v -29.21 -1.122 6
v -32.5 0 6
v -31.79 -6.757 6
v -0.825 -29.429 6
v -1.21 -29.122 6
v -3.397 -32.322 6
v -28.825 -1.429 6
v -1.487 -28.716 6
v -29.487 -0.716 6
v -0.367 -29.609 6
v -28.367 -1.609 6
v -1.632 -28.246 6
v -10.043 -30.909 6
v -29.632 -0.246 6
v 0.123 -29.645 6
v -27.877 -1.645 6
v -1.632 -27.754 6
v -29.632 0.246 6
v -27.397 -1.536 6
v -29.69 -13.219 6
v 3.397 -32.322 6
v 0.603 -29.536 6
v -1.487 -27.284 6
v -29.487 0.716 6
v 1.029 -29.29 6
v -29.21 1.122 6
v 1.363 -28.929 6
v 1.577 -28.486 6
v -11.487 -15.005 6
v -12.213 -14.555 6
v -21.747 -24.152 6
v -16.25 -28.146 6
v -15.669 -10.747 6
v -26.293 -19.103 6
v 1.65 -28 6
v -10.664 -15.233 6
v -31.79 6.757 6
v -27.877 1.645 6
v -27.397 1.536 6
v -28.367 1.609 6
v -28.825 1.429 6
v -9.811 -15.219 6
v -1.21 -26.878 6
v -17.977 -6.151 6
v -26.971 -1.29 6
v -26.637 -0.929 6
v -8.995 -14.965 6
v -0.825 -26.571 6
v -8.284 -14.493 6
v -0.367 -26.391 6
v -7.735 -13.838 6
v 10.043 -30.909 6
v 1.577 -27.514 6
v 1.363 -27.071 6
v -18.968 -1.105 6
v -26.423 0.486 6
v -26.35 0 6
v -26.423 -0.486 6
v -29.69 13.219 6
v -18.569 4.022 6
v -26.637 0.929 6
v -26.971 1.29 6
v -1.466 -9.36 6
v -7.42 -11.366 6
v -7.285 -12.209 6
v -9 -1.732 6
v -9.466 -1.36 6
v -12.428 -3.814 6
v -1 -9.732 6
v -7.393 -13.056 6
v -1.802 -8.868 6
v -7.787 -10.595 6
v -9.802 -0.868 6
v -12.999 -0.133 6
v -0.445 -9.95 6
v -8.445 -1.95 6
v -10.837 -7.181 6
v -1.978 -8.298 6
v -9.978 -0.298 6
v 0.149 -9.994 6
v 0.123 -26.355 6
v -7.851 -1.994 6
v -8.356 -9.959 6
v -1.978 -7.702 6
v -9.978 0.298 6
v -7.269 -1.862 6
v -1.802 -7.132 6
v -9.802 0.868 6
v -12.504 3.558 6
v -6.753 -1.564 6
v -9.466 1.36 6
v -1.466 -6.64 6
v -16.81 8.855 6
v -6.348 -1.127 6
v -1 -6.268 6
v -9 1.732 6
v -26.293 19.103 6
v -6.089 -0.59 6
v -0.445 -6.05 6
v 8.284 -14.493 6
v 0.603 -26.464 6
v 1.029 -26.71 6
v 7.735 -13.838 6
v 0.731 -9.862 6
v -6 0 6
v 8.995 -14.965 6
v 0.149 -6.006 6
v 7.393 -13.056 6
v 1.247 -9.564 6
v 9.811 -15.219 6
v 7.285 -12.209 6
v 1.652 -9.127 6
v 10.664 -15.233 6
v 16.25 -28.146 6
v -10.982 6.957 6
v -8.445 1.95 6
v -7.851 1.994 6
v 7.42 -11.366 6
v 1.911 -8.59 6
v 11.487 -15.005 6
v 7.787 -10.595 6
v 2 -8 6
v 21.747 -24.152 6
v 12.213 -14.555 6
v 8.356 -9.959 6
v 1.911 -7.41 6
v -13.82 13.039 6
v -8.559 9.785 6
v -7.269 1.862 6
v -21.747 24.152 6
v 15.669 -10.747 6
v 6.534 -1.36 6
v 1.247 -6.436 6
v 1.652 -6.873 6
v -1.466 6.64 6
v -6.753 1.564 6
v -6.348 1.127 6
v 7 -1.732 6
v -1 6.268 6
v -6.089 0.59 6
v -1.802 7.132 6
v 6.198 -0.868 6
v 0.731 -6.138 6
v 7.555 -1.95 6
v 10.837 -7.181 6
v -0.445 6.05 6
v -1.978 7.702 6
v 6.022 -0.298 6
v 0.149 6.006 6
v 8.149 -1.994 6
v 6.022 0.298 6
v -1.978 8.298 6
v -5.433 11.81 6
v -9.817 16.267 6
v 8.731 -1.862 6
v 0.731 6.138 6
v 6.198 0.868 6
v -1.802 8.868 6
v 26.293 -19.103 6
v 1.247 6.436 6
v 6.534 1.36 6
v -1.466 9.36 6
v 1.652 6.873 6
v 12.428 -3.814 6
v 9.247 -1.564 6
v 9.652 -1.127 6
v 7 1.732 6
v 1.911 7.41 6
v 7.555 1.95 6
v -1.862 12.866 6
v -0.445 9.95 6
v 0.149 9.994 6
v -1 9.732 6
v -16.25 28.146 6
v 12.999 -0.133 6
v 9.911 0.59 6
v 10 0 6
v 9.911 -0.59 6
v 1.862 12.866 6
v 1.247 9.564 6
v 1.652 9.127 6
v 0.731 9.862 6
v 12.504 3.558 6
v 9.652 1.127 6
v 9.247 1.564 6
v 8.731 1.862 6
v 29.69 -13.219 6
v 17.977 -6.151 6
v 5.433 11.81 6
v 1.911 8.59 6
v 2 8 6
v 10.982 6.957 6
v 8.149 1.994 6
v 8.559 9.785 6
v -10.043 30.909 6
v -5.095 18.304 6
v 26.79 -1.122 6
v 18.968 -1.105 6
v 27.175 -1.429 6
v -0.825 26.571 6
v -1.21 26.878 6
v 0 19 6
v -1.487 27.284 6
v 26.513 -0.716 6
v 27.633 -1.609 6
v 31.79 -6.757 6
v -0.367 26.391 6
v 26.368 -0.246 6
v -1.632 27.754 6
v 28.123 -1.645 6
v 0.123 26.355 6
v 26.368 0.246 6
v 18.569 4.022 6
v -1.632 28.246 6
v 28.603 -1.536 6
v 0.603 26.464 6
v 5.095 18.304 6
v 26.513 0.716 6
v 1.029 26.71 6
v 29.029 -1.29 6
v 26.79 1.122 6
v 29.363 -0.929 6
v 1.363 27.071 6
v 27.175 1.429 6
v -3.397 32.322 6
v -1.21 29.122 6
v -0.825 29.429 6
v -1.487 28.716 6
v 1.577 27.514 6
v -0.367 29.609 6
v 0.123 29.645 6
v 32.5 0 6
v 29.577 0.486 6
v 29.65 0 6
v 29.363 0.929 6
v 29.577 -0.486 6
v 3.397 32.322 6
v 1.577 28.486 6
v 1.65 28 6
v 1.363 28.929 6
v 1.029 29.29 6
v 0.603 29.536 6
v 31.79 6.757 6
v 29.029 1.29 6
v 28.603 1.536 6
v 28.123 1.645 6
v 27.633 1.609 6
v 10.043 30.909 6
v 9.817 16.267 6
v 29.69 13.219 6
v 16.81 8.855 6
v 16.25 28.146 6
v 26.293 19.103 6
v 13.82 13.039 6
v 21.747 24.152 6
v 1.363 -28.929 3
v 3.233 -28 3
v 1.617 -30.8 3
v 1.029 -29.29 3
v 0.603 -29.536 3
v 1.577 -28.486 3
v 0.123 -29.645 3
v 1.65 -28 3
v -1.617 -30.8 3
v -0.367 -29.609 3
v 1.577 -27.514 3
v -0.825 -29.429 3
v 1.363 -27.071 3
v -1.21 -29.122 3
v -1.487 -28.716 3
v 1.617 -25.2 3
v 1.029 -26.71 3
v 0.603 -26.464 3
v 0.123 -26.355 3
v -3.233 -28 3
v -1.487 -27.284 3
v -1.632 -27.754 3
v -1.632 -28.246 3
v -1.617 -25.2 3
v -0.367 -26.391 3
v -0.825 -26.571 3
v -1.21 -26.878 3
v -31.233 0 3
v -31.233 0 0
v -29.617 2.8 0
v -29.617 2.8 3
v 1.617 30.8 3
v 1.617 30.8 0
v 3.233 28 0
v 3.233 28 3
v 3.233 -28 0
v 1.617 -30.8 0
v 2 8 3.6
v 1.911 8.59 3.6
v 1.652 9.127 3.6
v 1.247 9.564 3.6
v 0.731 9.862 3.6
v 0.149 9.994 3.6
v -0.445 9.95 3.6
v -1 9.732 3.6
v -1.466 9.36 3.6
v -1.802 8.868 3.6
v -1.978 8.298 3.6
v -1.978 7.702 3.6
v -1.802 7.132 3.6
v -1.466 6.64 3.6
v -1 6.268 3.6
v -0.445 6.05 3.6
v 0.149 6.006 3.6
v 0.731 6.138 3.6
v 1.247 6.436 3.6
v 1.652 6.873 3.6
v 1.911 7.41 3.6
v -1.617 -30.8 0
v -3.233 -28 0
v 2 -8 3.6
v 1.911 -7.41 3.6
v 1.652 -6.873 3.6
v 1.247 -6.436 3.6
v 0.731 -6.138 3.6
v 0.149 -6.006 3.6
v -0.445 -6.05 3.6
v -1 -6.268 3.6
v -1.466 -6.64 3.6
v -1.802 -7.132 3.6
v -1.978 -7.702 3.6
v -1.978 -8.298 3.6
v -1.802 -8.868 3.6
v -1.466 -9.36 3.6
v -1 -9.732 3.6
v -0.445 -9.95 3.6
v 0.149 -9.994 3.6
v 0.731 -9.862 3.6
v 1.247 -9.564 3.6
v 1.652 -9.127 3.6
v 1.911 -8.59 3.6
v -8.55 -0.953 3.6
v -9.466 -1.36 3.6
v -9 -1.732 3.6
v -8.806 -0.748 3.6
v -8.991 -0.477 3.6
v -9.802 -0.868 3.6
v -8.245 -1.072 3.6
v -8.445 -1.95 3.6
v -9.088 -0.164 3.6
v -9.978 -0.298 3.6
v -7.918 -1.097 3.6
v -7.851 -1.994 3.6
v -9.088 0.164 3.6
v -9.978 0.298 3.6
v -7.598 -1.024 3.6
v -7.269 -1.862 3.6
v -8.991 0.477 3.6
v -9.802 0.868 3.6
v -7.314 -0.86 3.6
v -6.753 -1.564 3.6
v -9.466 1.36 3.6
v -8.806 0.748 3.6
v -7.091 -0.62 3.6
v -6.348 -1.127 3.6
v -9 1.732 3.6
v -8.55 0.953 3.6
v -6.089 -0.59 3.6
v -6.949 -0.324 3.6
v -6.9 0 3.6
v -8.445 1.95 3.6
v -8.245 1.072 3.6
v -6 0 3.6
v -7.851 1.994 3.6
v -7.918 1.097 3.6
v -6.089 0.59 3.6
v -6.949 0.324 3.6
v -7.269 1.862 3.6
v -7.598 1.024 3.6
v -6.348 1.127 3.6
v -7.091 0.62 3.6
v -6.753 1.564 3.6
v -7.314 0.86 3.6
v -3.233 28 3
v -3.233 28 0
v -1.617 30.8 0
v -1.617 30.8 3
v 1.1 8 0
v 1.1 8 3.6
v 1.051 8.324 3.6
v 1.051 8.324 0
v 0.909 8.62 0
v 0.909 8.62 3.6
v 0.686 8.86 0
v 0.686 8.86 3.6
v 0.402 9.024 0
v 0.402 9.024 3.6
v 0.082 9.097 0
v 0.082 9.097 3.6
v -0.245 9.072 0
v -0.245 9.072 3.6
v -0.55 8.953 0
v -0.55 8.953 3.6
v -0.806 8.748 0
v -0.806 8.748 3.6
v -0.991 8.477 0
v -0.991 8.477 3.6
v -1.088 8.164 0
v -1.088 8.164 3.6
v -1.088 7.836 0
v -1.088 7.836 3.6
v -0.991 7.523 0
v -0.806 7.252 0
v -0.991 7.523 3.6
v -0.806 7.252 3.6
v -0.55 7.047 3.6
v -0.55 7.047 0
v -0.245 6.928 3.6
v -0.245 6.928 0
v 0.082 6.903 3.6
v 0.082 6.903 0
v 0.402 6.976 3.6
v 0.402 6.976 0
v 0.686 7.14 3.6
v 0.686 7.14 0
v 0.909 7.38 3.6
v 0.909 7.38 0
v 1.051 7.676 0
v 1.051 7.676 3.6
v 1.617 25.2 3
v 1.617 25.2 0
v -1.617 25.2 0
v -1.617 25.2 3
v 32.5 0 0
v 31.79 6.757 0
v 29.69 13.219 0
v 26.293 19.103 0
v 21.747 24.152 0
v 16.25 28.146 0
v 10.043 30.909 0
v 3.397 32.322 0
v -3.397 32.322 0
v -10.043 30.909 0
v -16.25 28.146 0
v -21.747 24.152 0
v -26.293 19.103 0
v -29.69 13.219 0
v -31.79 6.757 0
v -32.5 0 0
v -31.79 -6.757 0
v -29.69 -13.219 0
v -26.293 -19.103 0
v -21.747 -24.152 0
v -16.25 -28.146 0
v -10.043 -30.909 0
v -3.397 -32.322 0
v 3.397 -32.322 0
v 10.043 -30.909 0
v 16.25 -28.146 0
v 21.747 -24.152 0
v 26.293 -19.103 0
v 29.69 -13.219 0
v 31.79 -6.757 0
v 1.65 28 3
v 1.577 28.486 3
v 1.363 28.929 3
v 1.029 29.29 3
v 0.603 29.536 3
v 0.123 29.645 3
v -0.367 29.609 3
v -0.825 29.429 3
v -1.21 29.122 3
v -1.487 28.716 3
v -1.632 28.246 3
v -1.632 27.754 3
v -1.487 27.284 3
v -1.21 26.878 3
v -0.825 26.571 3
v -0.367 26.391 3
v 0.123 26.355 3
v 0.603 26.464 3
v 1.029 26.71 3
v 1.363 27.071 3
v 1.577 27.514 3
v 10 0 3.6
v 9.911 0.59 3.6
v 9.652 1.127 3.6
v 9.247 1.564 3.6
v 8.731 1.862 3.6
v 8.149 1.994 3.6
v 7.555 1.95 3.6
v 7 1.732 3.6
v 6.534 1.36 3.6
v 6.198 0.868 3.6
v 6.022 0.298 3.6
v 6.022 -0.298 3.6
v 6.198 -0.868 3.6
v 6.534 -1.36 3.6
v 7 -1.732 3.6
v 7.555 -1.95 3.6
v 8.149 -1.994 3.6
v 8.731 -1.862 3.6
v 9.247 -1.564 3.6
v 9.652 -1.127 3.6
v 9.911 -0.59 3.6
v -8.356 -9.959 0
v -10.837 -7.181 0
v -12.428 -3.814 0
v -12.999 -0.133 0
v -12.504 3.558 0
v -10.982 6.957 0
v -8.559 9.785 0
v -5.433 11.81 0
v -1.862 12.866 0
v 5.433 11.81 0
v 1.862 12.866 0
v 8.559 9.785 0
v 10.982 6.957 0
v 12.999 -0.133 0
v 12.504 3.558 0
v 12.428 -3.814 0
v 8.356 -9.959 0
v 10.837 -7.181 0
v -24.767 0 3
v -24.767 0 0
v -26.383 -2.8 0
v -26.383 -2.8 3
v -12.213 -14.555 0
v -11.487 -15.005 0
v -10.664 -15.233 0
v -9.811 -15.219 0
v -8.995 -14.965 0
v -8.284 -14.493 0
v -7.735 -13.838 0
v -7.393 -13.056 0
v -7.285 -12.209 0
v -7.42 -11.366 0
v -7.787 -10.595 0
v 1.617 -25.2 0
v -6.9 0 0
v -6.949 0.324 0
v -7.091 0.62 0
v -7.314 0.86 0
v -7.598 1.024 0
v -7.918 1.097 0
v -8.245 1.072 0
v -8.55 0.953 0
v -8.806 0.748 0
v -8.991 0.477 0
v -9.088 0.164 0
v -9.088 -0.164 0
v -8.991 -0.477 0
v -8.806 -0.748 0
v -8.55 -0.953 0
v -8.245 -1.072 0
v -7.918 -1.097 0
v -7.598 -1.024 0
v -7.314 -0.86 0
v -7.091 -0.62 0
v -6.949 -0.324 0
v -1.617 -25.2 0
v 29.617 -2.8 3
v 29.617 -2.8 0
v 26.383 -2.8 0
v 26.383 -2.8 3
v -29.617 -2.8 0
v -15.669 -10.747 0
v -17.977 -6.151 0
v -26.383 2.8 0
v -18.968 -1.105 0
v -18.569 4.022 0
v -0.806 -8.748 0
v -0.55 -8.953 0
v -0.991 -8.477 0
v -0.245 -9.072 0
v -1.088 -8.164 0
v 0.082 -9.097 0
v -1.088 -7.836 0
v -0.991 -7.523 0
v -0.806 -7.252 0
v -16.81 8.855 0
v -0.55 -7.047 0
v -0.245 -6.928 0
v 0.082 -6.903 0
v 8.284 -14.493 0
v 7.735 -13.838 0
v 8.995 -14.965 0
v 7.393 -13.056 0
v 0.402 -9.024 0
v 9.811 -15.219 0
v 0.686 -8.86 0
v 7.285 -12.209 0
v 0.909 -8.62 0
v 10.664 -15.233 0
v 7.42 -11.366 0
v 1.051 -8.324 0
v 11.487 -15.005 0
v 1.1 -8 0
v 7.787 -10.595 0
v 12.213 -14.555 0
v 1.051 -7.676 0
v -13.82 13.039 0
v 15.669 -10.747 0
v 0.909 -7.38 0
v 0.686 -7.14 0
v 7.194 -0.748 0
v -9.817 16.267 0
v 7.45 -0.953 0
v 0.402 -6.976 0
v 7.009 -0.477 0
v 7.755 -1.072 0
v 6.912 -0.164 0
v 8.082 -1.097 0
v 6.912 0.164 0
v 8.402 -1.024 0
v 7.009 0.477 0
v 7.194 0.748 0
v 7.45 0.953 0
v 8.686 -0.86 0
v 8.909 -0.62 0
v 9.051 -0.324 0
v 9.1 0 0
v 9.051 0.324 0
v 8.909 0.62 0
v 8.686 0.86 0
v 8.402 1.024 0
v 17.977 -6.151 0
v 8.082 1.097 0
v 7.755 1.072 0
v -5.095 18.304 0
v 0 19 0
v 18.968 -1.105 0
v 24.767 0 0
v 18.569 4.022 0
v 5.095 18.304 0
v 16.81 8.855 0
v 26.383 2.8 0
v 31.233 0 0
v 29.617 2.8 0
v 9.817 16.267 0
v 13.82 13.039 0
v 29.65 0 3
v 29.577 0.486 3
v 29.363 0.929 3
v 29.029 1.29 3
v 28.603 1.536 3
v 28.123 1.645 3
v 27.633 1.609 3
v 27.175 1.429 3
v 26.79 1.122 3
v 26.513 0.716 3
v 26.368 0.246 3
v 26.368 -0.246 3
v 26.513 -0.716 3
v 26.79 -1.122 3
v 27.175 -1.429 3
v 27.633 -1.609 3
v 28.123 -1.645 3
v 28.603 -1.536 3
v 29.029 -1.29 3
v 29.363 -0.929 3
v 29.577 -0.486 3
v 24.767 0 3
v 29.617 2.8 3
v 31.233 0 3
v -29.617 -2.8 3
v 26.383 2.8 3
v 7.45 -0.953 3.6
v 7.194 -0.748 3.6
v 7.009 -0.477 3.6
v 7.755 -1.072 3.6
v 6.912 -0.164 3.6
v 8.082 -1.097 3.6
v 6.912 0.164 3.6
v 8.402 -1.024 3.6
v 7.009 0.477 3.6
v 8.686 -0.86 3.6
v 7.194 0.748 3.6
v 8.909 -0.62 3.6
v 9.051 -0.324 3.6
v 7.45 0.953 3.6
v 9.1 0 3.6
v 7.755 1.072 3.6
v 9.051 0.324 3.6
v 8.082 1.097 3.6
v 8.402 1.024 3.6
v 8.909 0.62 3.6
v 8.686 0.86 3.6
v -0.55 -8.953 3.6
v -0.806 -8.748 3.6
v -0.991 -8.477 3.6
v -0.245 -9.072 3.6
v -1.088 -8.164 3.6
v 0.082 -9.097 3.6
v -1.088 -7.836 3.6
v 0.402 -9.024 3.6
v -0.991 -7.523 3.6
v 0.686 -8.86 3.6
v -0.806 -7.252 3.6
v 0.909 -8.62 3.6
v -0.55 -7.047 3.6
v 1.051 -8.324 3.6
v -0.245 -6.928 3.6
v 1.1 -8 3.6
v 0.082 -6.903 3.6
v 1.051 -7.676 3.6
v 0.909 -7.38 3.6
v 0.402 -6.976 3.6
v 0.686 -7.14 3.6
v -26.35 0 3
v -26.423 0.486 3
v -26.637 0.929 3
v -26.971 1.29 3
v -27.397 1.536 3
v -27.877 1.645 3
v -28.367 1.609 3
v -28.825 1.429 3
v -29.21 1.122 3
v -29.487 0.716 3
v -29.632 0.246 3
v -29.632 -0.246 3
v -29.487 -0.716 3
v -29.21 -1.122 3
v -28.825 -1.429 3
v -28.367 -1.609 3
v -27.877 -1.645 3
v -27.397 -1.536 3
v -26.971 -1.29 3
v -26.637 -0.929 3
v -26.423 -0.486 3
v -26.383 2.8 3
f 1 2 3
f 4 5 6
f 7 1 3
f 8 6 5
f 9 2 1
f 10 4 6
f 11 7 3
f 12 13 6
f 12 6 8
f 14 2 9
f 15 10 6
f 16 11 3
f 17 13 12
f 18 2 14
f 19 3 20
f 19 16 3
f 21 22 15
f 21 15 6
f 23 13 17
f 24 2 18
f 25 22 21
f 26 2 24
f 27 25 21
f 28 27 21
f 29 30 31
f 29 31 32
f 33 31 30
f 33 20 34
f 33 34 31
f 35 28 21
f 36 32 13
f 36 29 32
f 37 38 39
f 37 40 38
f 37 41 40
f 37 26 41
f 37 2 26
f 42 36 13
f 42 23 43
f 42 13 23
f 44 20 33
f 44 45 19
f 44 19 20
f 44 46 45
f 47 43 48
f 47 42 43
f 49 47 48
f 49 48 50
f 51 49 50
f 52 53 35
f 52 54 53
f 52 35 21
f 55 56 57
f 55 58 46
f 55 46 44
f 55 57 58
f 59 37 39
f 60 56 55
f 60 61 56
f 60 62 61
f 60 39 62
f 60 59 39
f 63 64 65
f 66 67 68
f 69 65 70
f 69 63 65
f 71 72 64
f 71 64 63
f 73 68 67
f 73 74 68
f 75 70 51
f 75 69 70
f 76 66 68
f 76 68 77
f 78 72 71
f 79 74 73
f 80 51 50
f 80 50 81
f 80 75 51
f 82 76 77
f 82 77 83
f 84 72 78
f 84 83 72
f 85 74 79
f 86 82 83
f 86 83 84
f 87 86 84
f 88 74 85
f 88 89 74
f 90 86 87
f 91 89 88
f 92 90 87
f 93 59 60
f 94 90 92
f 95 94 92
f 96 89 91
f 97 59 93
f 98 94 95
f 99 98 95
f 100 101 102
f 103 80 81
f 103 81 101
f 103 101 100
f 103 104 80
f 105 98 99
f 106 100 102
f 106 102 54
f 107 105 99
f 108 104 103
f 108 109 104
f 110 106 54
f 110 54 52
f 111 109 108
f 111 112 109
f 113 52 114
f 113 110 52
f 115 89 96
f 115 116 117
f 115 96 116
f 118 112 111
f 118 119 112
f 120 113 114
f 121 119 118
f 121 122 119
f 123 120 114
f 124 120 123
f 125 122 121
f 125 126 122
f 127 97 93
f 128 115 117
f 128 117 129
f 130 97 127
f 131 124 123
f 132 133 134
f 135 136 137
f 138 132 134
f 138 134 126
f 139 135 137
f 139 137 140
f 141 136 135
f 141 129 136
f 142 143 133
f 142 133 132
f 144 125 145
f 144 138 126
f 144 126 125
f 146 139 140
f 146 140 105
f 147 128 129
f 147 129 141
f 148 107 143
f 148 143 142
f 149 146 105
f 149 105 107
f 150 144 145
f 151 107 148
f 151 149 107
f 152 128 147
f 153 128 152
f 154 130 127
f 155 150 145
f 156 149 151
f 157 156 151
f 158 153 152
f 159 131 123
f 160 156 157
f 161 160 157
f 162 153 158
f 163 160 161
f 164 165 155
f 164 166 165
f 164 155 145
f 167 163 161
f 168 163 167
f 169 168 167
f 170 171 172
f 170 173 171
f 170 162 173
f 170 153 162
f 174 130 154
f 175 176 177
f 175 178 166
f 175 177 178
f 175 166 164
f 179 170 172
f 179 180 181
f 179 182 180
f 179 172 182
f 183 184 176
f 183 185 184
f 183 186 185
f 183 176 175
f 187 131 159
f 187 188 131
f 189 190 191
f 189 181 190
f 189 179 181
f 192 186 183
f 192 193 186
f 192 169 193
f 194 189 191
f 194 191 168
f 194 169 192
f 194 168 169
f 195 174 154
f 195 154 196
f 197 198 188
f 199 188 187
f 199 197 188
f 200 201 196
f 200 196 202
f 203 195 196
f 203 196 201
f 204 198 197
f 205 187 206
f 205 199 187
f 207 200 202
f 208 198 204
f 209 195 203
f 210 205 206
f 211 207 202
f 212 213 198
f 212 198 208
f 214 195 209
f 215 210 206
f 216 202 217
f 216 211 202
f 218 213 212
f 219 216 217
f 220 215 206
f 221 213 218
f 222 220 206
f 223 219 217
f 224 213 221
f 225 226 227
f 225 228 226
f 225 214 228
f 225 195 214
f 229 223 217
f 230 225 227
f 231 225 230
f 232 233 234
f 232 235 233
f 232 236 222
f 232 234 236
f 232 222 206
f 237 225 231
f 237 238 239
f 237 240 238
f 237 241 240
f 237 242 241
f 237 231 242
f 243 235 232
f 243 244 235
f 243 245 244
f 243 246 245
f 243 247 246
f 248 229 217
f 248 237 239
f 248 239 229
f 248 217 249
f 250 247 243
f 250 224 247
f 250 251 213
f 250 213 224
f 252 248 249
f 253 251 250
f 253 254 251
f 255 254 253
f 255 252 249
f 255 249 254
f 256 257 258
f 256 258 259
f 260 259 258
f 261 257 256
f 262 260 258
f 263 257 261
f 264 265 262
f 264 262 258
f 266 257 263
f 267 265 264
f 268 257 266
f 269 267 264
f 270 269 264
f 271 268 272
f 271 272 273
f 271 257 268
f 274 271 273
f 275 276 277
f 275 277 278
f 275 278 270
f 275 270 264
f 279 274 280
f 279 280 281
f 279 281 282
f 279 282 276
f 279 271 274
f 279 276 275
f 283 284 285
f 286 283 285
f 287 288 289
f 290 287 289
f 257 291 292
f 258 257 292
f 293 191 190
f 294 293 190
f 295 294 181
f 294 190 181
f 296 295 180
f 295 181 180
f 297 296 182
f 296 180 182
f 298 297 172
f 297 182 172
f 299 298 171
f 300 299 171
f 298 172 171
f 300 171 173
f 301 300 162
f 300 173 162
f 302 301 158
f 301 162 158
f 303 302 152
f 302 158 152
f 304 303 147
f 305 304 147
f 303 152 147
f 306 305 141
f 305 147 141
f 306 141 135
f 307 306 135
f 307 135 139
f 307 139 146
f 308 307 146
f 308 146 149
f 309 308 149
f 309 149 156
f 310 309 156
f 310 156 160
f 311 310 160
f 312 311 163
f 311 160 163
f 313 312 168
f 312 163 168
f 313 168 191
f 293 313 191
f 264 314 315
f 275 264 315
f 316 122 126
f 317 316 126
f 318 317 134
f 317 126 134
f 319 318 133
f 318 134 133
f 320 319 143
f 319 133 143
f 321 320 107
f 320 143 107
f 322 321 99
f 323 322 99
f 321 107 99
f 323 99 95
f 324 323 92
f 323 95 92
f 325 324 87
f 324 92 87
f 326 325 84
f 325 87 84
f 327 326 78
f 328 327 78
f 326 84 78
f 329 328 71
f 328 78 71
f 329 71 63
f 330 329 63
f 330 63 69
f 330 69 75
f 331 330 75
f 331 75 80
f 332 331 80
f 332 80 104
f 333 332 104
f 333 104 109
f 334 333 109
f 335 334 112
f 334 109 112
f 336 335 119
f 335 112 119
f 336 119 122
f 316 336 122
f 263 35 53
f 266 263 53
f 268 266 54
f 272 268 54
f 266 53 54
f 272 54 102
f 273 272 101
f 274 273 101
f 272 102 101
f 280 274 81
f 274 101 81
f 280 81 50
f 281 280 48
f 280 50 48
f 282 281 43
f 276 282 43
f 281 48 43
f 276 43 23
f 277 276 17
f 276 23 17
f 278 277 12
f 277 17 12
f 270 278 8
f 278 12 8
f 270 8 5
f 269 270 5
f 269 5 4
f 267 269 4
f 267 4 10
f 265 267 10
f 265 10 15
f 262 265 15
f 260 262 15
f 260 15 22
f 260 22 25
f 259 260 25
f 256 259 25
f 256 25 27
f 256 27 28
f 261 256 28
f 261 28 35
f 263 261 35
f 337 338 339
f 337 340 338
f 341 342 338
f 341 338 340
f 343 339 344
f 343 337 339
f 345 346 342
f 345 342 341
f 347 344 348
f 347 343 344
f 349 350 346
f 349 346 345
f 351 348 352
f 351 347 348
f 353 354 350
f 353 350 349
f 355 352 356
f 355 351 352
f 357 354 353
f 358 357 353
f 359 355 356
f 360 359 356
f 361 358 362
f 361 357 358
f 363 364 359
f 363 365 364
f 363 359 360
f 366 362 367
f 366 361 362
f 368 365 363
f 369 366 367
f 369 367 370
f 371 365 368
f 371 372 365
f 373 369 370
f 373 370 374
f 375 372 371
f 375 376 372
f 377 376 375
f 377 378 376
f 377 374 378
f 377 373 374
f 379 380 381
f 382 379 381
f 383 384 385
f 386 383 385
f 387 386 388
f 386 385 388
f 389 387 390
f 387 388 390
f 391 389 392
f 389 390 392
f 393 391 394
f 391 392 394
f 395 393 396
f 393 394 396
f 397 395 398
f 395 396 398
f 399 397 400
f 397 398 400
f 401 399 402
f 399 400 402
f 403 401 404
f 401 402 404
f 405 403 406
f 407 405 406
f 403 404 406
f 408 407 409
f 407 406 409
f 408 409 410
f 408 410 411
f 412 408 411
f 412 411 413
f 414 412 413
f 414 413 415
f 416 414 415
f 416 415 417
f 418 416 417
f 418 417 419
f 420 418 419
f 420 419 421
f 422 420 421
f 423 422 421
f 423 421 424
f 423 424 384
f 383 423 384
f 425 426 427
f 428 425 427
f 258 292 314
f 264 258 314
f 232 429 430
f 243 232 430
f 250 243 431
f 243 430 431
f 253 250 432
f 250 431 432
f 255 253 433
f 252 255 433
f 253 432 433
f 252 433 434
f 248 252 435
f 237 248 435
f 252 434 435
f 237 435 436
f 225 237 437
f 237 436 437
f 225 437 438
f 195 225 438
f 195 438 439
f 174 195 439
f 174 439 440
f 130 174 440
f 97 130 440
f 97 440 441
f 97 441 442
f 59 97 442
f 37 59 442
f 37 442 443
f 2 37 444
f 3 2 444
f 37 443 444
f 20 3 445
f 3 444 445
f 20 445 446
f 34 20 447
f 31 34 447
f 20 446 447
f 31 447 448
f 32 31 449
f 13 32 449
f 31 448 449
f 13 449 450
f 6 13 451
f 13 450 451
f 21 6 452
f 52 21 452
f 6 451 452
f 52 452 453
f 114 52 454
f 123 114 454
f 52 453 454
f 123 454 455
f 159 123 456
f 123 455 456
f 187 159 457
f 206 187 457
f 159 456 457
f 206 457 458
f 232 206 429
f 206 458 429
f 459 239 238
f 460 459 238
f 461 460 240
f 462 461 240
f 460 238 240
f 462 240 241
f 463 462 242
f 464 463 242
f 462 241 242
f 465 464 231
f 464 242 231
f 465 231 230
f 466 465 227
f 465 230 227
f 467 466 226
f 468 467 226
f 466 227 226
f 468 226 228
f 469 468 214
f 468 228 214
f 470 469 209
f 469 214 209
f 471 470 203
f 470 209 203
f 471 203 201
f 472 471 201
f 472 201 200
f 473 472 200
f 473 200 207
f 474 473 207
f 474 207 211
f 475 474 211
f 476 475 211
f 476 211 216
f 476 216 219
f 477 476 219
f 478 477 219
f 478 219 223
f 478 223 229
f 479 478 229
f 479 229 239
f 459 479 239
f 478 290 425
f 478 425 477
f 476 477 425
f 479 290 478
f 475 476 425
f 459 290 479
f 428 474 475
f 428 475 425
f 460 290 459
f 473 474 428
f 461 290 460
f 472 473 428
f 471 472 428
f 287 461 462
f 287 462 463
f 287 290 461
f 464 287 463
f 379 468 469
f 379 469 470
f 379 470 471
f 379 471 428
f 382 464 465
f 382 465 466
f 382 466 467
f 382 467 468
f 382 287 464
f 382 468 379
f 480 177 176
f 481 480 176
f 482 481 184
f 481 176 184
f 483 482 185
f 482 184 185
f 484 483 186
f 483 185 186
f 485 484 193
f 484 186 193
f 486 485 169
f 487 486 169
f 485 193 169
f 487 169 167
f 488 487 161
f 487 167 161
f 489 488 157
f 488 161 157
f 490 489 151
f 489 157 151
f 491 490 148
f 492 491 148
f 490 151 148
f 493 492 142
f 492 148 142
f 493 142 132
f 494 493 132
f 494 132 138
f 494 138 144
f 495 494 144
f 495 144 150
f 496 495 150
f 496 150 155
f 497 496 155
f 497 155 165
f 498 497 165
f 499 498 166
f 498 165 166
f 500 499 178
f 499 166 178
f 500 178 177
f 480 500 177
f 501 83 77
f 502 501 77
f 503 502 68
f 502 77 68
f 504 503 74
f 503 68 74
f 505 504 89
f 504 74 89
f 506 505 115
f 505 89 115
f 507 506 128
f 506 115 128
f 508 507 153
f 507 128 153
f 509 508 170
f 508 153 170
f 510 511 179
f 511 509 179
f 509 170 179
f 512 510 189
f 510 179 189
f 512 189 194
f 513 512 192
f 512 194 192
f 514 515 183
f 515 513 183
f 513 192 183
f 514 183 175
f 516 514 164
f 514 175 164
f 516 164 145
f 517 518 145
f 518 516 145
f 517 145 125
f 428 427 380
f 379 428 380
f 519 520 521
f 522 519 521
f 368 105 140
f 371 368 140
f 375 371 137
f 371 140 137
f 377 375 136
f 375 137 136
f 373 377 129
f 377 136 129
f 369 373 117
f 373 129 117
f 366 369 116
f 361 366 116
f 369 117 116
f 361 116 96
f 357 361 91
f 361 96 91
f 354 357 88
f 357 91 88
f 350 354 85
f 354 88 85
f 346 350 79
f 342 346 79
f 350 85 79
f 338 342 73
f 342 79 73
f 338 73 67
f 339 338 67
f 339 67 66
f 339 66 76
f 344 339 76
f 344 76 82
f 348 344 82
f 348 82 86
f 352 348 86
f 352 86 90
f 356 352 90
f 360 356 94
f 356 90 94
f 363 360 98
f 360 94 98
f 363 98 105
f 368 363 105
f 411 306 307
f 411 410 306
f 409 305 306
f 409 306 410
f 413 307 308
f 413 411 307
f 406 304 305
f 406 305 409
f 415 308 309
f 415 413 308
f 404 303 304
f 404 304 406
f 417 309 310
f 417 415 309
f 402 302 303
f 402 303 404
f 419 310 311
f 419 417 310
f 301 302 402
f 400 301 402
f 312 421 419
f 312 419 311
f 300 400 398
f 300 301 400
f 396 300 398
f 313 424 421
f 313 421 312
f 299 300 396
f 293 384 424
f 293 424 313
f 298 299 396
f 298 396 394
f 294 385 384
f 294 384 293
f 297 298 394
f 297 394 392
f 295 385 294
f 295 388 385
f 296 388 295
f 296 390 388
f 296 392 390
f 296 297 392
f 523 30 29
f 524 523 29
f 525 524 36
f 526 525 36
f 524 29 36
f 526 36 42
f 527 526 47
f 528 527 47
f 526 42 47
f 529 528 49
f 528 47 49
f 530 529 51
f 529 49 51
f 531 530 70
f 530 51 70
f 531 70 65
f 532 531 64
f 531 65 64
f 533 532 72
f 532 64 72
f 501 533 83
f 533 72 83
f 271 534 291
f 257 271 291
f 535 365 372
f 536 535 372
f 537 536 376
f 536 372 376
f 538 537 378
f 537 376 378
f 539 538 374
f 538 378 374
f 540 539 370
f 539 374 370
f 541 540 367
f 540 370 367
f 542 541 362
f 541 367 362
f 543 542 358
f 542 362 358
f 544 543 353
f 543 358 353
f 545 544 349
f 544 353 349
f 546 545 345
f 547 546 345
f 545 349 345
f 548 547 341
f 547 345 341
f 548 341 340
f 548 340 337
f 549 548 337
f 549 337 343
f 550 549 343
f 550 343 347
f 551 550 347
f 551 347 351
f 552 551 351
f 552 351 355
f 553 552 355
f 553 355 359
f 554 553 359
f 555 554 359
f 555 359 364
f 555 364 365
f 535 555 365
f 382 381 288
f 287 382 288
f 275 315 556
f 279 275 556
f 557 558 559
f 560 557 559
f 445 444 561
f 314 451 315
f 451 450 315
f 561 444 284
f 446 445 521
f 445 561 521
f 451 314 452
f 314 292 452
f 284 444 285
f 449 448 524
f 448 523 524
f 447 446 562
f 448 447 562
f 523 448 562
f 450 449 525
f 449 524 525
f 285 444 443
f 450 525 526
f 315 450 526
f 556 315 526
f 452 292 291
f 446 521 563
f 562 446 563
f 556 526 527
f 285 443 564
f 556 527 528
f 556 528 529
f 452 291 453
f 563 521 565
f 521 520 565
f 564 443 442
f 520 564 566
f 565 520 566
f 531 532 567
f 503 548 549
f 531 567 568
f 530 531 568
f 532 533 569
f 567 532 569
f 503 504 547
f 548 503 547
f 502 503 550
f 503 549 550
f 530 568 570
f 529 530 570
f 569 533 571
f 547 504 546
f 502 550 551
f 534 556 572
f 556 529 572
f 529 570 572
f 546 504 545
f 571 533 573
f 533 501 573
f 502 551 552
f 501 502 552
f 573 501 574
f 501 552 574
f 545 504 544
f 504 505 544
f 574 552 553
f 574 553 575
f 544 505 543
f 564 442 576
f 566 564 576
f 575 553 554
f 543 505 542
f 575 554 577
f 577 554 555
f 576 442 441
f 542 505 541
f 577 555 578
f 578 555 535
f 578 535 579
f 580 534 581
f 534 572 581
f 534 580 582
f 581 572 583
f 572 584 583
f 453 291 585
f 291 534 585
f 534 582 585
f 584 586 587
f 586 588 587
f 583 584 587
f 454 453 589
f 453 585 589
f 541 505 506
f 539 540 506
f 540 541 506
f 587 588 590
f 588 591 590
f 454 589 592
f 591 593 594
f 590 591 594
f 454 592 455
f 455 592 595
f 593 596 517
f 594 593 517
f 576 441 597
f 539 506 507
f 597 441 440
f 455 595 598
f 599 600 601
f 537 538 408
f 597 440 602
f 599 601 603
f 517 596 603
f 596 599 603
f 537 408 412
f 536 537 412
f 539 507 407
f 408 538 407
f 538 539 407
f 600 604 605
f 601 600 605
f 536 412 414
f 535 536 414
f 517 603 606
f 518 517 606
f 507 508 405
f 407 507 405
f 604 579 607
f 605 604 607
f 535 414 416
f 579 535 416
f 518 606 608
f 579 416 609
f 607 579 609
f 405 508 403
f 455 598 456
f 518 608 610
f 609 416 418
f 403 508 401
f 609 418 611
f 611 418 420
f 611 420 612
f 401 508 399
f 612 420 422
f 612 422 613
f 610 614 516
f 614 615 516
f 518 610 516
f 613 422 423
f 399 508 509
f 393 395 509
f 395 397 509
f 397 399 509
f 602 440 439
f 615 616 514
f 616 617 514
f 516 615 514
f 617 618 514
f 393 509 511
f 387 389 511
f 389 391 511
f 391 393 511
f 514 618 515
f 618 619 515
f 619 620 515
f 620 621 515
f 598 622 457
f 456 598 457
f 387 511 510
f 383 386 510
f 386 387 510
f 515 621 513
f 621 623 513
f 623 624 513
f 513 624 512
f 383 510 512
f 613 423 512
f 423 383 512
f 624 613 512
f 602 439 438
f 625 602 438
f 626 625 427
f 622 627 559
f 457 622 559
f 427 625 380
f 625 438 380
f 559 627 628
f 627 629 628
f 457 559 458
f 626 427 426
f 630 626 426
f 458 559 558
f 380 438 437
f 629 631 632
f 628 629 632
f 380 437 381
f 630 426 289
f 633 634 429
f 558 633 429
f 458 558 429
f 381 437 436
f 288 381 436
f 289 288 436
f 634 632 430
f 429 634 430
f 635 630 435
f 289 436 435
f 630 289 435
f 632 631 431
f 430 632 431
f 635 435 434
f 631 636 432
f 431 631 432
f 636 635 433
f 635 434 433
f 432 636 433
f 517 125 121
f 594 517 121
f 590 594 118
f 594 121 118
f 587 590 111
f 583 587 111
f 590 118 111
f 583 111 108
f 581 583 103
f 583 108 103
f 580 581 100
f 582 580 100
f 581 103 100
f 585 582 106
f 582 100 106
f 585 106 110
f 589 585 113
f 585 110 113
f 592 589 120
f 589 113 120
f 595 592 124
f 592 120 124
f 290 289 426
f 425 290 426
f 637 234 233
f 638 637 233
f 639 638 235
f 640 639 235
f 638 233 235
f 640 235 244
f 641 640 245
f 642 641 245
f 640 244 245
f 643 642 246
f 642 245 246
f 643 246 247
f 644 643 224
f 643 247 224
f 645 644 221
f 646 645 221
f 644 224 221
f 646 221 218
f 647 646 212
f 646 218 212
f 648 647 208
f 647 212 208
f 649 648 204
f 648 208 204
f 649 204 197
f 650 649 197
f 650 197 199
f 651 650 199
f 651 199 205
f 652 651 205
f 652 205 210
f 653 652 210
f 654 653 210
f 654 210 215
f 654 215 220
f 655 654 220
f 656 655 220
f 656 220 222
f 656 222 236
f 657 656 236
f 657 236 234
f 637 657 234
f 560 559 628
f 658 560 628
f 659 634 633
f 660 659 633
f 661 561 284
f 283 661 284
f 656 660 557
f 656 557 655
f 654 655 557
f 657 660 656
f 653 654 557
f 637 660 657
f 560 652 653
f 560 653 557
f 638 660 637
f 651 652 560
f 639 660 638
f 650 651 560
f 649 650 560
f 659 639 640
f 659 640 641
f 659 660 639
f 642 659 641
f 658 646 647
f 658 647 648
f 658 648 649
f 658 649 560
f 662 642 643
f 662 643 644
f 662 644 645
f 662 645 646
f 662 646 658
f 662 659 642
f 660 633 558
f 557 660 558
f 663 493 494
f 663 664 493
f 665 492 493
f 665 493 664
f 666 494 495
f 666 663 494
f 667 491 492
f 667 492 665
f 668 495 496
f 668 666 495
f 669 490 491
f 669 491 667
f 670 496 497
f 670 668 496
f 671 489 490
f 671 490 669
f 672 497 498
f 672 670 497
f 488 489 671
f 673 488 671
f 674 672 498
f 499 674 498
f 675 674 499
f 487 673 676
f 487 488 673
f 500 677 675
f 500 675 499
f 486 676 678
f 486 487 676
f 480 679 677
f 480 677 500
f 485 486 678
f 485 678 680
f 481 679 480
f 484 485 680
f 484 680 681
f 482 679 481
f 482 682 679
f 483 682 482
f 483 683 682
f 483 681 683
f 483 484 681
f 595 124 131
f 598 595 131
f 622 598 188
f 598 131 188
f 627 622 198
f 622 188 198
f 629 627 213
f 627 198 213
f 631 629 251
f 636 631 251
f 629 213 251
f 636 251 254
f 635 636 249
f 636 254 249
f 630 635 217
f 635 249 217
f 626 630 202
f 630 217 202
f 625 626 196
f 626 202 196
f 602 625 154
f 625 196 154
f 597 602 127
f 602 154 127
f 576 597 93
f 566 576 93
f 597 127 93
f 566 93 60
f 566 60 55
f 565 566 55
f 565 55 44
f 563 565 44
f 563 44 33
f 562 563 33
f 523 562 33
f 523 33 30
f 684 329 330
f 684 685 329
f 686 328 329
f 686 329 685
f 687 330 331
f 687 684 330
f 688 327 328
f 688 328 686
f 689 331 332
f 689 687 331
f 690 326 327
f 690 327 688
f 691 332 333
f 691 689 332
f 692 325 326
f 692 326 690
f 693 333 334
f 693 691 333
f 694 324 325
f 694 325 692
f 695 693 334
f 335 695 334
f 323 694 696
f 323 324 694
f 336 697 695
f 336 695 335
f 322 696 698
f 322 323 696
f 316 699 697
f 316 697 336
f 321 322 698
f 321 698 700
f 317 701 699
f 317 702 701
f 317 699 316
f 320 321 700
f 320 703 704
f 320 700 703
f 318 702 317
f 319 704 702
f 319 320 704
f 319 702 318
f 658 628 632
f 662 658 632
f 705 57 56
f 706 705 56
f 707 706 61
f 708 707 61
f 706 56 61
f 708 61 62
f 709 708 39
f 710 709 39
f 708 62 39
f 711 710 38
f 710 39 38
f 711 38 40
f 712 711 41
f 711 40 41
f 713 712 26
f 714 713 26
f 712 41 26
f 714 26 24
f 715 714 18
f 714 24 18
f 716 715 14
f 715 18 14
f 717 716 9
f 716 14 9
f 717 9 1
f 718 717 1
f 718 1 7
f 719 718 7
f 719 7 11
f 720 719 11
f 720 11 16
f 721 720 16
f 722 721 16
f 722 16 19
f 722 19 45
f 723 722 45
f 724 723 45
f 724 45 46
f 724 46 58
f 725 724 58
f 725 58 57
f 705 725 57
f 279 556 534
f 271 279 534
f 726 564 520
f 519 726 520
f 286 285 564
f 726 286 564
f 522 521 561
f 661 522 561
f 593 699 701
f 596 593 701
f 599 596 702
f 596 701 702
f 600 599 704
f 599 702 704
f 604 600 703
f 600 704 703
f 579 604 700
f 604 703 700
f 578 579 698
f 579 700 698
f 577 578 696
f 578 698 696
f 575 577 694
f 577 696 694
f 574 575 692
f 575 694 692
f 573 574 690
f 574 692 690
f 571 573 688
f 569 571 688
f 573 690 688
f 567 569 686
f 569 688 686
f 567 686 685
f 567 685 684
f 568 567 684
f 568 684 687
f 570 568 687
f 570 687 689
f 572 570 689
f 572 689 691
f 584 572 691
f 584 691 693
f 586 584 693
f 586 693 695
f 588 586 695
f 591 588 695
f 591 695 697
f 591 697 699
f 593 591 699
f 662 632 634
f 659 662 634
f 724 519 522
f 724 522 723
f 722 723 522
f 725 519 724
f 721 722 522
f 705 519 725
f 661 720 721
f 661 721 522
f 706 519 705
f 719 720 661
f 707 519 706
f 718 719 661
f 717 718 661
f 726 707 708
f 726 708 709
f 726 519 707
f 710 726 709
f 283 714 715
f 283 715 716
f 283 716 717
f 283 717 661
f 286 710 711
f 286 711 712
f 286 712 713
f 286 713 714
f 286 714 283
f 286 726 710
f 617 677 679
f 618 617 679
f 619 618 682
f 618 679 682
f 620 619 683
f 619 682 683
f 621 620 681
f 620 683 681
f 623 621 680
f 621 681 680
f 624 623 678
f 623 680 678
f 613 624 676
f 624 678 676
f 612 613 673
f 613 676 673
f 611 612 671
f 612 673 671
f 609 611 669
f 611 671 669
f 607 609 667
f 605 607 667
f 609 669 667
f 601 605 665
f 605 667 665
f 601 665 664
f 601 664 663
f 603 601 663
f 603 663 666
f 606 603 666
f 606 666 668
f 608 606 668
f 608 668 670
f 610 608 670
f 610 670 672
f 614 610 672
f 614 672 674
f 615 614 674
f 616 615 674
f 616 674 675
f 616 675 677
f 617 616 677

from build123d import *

# Parameters (mm, degrees)
SKETCH1_R           = 32.5
BOSS_EXTRUDE1_DEPTH = 6
SKETCH16_R          = 1.1
CUT_EXTRUDE8_DEPTH  = 7
SKETCH17_R          = 2
CUT_EXTRUDE9_DEPTH  = 2.4
SKETCH12_R          = 1.65
CUT_EXTRUDE10_DEPTH = 7
CUT_EXTRUDE11_DEPTH = 3
CUT_EXTRUDE12_DEPTH = 7


with BuildPart() as part:
    # Sketch1 → Boss-Extrude1 (new body)
    with BuildSketch(Plane.XY):
        Circle(SKETCH1_R)
    extrude(amount=BOSS_EXTRUDE1_DEPTH)

    # Sketch16 → Cut-Extrude8 (cut, through all)
    with BuildSketch(Plane.XY.offset(6)):
        with Locations((8, 0)):
            Circle(SKETCH16_R)
        with Locations((-8, 0)):
            Circle(SKETCH16_R)
        with Locations((0, -8)):
            Circle(SKETCH16_R)
        with Locations((0, 8)):
            Circle(SKETCH16_R)
    extrude(amount=-CUT_EXTRUDE8_DEPTH, mode=Mode.SUBTRACT)

    # Sketch17 → Cut-Extrude9 (cut)
    with BuildSketch(Plane.XY.offset(6)):
        with Locations((8, 0)):
            Circle(SKETCH17_R)
        with Locations((-8, 0)):
            Circle(SKETCH17_R)
        with Locations((0, -8)):
            Circle(SKETCH17_R)
        with Locations((0, 8)):
            Circle(SKETCH17_R)
    extrude(amount=-CUT_EXTRUDE9_DEPTH, mode=Mode.SUBTRACT)

    # Sketch12 → Cut-Extrude10 (cut, through all)
    with BuildSketch(Plane.XY.offset(6)):
        with Locations((0, 28)):
            Circle(SKETCH12_R)
        with Locations((28, 0)):
            Circle(SKETCH12_R)
        with Locations((0, -28)):
            Circle(SKETCH12_R)
        with Locations((-28, 0)):
            Circle(SKETCH12_R)
    extrude(amount=-CUT_EXTRUDE10_DEPTH, mode=Mode.SUBTRACT)

    # Sketch18 → Cut-Extrude11 (cut)
    with BuildSketch(Plane(origin=(0, 0, 0), x_dir=(-1, 0, 0), z_dir=(0, 0, -1))):
        Polygon((1.616580754, 30.8), (-1.616580754, 30.8), (-3.233161507, 28), (-1.616580754, 25.2), (1.616580754, 25.2), (3.233161507, 28), align=None)
        Polygon((29.616580754, 2.8), (26.383419246, 2.8), (24.766838493, 0), (26.383419246, -2.8), (29.616580754, -2.8), (31.233161507, 0), align=None)
        Polygon((1.616580754, -25.2), (-1.616580754, -25.2), (-3.233161507, -28), (-1.616580754, -30.8), (1.616580754, -30.8), (3.233161507, -28), align=None)
        Polygon((-26.383419246, 2.8), (-29.616580754, 2.8), (-31.233161507, 0), (-29.616580754, -2.8), (-26.383419246, -2.8), (-24.766838493, 0), align=None)
    extrude(amount=-CUT_EXTRUDE11_DEPTH, mode=Mode.SUBTRACT)

    # Sketch19 → Cut-Extrude12 (cut, through all)
    with BuildSketch(Plane.XY.offset(6)):
        with BuildLine():
            ThreePointArc((12.212964584, -14.554844419), (0, 19), (-12.212964584, -14.554844419))
            ThreePointArc((-12.212964584, -14.554844419), (-7.986468426, -14.185073919), (-8.356238926, -9.958577761))
            ThreePointArc((-8.356238926, -9.958577761), (0, 13), (8.356238926, -9.958577761))
            ThreePointArc((8.356238926, -9.958577761), (7.986468426, -14.185073919), (12.212964584, -14.554844419))
        make_face()
    extrude(amount=-CUT_EXTRUDE12_DEPTH, mode=Mode.SUBTRACT)


solid = part.part
